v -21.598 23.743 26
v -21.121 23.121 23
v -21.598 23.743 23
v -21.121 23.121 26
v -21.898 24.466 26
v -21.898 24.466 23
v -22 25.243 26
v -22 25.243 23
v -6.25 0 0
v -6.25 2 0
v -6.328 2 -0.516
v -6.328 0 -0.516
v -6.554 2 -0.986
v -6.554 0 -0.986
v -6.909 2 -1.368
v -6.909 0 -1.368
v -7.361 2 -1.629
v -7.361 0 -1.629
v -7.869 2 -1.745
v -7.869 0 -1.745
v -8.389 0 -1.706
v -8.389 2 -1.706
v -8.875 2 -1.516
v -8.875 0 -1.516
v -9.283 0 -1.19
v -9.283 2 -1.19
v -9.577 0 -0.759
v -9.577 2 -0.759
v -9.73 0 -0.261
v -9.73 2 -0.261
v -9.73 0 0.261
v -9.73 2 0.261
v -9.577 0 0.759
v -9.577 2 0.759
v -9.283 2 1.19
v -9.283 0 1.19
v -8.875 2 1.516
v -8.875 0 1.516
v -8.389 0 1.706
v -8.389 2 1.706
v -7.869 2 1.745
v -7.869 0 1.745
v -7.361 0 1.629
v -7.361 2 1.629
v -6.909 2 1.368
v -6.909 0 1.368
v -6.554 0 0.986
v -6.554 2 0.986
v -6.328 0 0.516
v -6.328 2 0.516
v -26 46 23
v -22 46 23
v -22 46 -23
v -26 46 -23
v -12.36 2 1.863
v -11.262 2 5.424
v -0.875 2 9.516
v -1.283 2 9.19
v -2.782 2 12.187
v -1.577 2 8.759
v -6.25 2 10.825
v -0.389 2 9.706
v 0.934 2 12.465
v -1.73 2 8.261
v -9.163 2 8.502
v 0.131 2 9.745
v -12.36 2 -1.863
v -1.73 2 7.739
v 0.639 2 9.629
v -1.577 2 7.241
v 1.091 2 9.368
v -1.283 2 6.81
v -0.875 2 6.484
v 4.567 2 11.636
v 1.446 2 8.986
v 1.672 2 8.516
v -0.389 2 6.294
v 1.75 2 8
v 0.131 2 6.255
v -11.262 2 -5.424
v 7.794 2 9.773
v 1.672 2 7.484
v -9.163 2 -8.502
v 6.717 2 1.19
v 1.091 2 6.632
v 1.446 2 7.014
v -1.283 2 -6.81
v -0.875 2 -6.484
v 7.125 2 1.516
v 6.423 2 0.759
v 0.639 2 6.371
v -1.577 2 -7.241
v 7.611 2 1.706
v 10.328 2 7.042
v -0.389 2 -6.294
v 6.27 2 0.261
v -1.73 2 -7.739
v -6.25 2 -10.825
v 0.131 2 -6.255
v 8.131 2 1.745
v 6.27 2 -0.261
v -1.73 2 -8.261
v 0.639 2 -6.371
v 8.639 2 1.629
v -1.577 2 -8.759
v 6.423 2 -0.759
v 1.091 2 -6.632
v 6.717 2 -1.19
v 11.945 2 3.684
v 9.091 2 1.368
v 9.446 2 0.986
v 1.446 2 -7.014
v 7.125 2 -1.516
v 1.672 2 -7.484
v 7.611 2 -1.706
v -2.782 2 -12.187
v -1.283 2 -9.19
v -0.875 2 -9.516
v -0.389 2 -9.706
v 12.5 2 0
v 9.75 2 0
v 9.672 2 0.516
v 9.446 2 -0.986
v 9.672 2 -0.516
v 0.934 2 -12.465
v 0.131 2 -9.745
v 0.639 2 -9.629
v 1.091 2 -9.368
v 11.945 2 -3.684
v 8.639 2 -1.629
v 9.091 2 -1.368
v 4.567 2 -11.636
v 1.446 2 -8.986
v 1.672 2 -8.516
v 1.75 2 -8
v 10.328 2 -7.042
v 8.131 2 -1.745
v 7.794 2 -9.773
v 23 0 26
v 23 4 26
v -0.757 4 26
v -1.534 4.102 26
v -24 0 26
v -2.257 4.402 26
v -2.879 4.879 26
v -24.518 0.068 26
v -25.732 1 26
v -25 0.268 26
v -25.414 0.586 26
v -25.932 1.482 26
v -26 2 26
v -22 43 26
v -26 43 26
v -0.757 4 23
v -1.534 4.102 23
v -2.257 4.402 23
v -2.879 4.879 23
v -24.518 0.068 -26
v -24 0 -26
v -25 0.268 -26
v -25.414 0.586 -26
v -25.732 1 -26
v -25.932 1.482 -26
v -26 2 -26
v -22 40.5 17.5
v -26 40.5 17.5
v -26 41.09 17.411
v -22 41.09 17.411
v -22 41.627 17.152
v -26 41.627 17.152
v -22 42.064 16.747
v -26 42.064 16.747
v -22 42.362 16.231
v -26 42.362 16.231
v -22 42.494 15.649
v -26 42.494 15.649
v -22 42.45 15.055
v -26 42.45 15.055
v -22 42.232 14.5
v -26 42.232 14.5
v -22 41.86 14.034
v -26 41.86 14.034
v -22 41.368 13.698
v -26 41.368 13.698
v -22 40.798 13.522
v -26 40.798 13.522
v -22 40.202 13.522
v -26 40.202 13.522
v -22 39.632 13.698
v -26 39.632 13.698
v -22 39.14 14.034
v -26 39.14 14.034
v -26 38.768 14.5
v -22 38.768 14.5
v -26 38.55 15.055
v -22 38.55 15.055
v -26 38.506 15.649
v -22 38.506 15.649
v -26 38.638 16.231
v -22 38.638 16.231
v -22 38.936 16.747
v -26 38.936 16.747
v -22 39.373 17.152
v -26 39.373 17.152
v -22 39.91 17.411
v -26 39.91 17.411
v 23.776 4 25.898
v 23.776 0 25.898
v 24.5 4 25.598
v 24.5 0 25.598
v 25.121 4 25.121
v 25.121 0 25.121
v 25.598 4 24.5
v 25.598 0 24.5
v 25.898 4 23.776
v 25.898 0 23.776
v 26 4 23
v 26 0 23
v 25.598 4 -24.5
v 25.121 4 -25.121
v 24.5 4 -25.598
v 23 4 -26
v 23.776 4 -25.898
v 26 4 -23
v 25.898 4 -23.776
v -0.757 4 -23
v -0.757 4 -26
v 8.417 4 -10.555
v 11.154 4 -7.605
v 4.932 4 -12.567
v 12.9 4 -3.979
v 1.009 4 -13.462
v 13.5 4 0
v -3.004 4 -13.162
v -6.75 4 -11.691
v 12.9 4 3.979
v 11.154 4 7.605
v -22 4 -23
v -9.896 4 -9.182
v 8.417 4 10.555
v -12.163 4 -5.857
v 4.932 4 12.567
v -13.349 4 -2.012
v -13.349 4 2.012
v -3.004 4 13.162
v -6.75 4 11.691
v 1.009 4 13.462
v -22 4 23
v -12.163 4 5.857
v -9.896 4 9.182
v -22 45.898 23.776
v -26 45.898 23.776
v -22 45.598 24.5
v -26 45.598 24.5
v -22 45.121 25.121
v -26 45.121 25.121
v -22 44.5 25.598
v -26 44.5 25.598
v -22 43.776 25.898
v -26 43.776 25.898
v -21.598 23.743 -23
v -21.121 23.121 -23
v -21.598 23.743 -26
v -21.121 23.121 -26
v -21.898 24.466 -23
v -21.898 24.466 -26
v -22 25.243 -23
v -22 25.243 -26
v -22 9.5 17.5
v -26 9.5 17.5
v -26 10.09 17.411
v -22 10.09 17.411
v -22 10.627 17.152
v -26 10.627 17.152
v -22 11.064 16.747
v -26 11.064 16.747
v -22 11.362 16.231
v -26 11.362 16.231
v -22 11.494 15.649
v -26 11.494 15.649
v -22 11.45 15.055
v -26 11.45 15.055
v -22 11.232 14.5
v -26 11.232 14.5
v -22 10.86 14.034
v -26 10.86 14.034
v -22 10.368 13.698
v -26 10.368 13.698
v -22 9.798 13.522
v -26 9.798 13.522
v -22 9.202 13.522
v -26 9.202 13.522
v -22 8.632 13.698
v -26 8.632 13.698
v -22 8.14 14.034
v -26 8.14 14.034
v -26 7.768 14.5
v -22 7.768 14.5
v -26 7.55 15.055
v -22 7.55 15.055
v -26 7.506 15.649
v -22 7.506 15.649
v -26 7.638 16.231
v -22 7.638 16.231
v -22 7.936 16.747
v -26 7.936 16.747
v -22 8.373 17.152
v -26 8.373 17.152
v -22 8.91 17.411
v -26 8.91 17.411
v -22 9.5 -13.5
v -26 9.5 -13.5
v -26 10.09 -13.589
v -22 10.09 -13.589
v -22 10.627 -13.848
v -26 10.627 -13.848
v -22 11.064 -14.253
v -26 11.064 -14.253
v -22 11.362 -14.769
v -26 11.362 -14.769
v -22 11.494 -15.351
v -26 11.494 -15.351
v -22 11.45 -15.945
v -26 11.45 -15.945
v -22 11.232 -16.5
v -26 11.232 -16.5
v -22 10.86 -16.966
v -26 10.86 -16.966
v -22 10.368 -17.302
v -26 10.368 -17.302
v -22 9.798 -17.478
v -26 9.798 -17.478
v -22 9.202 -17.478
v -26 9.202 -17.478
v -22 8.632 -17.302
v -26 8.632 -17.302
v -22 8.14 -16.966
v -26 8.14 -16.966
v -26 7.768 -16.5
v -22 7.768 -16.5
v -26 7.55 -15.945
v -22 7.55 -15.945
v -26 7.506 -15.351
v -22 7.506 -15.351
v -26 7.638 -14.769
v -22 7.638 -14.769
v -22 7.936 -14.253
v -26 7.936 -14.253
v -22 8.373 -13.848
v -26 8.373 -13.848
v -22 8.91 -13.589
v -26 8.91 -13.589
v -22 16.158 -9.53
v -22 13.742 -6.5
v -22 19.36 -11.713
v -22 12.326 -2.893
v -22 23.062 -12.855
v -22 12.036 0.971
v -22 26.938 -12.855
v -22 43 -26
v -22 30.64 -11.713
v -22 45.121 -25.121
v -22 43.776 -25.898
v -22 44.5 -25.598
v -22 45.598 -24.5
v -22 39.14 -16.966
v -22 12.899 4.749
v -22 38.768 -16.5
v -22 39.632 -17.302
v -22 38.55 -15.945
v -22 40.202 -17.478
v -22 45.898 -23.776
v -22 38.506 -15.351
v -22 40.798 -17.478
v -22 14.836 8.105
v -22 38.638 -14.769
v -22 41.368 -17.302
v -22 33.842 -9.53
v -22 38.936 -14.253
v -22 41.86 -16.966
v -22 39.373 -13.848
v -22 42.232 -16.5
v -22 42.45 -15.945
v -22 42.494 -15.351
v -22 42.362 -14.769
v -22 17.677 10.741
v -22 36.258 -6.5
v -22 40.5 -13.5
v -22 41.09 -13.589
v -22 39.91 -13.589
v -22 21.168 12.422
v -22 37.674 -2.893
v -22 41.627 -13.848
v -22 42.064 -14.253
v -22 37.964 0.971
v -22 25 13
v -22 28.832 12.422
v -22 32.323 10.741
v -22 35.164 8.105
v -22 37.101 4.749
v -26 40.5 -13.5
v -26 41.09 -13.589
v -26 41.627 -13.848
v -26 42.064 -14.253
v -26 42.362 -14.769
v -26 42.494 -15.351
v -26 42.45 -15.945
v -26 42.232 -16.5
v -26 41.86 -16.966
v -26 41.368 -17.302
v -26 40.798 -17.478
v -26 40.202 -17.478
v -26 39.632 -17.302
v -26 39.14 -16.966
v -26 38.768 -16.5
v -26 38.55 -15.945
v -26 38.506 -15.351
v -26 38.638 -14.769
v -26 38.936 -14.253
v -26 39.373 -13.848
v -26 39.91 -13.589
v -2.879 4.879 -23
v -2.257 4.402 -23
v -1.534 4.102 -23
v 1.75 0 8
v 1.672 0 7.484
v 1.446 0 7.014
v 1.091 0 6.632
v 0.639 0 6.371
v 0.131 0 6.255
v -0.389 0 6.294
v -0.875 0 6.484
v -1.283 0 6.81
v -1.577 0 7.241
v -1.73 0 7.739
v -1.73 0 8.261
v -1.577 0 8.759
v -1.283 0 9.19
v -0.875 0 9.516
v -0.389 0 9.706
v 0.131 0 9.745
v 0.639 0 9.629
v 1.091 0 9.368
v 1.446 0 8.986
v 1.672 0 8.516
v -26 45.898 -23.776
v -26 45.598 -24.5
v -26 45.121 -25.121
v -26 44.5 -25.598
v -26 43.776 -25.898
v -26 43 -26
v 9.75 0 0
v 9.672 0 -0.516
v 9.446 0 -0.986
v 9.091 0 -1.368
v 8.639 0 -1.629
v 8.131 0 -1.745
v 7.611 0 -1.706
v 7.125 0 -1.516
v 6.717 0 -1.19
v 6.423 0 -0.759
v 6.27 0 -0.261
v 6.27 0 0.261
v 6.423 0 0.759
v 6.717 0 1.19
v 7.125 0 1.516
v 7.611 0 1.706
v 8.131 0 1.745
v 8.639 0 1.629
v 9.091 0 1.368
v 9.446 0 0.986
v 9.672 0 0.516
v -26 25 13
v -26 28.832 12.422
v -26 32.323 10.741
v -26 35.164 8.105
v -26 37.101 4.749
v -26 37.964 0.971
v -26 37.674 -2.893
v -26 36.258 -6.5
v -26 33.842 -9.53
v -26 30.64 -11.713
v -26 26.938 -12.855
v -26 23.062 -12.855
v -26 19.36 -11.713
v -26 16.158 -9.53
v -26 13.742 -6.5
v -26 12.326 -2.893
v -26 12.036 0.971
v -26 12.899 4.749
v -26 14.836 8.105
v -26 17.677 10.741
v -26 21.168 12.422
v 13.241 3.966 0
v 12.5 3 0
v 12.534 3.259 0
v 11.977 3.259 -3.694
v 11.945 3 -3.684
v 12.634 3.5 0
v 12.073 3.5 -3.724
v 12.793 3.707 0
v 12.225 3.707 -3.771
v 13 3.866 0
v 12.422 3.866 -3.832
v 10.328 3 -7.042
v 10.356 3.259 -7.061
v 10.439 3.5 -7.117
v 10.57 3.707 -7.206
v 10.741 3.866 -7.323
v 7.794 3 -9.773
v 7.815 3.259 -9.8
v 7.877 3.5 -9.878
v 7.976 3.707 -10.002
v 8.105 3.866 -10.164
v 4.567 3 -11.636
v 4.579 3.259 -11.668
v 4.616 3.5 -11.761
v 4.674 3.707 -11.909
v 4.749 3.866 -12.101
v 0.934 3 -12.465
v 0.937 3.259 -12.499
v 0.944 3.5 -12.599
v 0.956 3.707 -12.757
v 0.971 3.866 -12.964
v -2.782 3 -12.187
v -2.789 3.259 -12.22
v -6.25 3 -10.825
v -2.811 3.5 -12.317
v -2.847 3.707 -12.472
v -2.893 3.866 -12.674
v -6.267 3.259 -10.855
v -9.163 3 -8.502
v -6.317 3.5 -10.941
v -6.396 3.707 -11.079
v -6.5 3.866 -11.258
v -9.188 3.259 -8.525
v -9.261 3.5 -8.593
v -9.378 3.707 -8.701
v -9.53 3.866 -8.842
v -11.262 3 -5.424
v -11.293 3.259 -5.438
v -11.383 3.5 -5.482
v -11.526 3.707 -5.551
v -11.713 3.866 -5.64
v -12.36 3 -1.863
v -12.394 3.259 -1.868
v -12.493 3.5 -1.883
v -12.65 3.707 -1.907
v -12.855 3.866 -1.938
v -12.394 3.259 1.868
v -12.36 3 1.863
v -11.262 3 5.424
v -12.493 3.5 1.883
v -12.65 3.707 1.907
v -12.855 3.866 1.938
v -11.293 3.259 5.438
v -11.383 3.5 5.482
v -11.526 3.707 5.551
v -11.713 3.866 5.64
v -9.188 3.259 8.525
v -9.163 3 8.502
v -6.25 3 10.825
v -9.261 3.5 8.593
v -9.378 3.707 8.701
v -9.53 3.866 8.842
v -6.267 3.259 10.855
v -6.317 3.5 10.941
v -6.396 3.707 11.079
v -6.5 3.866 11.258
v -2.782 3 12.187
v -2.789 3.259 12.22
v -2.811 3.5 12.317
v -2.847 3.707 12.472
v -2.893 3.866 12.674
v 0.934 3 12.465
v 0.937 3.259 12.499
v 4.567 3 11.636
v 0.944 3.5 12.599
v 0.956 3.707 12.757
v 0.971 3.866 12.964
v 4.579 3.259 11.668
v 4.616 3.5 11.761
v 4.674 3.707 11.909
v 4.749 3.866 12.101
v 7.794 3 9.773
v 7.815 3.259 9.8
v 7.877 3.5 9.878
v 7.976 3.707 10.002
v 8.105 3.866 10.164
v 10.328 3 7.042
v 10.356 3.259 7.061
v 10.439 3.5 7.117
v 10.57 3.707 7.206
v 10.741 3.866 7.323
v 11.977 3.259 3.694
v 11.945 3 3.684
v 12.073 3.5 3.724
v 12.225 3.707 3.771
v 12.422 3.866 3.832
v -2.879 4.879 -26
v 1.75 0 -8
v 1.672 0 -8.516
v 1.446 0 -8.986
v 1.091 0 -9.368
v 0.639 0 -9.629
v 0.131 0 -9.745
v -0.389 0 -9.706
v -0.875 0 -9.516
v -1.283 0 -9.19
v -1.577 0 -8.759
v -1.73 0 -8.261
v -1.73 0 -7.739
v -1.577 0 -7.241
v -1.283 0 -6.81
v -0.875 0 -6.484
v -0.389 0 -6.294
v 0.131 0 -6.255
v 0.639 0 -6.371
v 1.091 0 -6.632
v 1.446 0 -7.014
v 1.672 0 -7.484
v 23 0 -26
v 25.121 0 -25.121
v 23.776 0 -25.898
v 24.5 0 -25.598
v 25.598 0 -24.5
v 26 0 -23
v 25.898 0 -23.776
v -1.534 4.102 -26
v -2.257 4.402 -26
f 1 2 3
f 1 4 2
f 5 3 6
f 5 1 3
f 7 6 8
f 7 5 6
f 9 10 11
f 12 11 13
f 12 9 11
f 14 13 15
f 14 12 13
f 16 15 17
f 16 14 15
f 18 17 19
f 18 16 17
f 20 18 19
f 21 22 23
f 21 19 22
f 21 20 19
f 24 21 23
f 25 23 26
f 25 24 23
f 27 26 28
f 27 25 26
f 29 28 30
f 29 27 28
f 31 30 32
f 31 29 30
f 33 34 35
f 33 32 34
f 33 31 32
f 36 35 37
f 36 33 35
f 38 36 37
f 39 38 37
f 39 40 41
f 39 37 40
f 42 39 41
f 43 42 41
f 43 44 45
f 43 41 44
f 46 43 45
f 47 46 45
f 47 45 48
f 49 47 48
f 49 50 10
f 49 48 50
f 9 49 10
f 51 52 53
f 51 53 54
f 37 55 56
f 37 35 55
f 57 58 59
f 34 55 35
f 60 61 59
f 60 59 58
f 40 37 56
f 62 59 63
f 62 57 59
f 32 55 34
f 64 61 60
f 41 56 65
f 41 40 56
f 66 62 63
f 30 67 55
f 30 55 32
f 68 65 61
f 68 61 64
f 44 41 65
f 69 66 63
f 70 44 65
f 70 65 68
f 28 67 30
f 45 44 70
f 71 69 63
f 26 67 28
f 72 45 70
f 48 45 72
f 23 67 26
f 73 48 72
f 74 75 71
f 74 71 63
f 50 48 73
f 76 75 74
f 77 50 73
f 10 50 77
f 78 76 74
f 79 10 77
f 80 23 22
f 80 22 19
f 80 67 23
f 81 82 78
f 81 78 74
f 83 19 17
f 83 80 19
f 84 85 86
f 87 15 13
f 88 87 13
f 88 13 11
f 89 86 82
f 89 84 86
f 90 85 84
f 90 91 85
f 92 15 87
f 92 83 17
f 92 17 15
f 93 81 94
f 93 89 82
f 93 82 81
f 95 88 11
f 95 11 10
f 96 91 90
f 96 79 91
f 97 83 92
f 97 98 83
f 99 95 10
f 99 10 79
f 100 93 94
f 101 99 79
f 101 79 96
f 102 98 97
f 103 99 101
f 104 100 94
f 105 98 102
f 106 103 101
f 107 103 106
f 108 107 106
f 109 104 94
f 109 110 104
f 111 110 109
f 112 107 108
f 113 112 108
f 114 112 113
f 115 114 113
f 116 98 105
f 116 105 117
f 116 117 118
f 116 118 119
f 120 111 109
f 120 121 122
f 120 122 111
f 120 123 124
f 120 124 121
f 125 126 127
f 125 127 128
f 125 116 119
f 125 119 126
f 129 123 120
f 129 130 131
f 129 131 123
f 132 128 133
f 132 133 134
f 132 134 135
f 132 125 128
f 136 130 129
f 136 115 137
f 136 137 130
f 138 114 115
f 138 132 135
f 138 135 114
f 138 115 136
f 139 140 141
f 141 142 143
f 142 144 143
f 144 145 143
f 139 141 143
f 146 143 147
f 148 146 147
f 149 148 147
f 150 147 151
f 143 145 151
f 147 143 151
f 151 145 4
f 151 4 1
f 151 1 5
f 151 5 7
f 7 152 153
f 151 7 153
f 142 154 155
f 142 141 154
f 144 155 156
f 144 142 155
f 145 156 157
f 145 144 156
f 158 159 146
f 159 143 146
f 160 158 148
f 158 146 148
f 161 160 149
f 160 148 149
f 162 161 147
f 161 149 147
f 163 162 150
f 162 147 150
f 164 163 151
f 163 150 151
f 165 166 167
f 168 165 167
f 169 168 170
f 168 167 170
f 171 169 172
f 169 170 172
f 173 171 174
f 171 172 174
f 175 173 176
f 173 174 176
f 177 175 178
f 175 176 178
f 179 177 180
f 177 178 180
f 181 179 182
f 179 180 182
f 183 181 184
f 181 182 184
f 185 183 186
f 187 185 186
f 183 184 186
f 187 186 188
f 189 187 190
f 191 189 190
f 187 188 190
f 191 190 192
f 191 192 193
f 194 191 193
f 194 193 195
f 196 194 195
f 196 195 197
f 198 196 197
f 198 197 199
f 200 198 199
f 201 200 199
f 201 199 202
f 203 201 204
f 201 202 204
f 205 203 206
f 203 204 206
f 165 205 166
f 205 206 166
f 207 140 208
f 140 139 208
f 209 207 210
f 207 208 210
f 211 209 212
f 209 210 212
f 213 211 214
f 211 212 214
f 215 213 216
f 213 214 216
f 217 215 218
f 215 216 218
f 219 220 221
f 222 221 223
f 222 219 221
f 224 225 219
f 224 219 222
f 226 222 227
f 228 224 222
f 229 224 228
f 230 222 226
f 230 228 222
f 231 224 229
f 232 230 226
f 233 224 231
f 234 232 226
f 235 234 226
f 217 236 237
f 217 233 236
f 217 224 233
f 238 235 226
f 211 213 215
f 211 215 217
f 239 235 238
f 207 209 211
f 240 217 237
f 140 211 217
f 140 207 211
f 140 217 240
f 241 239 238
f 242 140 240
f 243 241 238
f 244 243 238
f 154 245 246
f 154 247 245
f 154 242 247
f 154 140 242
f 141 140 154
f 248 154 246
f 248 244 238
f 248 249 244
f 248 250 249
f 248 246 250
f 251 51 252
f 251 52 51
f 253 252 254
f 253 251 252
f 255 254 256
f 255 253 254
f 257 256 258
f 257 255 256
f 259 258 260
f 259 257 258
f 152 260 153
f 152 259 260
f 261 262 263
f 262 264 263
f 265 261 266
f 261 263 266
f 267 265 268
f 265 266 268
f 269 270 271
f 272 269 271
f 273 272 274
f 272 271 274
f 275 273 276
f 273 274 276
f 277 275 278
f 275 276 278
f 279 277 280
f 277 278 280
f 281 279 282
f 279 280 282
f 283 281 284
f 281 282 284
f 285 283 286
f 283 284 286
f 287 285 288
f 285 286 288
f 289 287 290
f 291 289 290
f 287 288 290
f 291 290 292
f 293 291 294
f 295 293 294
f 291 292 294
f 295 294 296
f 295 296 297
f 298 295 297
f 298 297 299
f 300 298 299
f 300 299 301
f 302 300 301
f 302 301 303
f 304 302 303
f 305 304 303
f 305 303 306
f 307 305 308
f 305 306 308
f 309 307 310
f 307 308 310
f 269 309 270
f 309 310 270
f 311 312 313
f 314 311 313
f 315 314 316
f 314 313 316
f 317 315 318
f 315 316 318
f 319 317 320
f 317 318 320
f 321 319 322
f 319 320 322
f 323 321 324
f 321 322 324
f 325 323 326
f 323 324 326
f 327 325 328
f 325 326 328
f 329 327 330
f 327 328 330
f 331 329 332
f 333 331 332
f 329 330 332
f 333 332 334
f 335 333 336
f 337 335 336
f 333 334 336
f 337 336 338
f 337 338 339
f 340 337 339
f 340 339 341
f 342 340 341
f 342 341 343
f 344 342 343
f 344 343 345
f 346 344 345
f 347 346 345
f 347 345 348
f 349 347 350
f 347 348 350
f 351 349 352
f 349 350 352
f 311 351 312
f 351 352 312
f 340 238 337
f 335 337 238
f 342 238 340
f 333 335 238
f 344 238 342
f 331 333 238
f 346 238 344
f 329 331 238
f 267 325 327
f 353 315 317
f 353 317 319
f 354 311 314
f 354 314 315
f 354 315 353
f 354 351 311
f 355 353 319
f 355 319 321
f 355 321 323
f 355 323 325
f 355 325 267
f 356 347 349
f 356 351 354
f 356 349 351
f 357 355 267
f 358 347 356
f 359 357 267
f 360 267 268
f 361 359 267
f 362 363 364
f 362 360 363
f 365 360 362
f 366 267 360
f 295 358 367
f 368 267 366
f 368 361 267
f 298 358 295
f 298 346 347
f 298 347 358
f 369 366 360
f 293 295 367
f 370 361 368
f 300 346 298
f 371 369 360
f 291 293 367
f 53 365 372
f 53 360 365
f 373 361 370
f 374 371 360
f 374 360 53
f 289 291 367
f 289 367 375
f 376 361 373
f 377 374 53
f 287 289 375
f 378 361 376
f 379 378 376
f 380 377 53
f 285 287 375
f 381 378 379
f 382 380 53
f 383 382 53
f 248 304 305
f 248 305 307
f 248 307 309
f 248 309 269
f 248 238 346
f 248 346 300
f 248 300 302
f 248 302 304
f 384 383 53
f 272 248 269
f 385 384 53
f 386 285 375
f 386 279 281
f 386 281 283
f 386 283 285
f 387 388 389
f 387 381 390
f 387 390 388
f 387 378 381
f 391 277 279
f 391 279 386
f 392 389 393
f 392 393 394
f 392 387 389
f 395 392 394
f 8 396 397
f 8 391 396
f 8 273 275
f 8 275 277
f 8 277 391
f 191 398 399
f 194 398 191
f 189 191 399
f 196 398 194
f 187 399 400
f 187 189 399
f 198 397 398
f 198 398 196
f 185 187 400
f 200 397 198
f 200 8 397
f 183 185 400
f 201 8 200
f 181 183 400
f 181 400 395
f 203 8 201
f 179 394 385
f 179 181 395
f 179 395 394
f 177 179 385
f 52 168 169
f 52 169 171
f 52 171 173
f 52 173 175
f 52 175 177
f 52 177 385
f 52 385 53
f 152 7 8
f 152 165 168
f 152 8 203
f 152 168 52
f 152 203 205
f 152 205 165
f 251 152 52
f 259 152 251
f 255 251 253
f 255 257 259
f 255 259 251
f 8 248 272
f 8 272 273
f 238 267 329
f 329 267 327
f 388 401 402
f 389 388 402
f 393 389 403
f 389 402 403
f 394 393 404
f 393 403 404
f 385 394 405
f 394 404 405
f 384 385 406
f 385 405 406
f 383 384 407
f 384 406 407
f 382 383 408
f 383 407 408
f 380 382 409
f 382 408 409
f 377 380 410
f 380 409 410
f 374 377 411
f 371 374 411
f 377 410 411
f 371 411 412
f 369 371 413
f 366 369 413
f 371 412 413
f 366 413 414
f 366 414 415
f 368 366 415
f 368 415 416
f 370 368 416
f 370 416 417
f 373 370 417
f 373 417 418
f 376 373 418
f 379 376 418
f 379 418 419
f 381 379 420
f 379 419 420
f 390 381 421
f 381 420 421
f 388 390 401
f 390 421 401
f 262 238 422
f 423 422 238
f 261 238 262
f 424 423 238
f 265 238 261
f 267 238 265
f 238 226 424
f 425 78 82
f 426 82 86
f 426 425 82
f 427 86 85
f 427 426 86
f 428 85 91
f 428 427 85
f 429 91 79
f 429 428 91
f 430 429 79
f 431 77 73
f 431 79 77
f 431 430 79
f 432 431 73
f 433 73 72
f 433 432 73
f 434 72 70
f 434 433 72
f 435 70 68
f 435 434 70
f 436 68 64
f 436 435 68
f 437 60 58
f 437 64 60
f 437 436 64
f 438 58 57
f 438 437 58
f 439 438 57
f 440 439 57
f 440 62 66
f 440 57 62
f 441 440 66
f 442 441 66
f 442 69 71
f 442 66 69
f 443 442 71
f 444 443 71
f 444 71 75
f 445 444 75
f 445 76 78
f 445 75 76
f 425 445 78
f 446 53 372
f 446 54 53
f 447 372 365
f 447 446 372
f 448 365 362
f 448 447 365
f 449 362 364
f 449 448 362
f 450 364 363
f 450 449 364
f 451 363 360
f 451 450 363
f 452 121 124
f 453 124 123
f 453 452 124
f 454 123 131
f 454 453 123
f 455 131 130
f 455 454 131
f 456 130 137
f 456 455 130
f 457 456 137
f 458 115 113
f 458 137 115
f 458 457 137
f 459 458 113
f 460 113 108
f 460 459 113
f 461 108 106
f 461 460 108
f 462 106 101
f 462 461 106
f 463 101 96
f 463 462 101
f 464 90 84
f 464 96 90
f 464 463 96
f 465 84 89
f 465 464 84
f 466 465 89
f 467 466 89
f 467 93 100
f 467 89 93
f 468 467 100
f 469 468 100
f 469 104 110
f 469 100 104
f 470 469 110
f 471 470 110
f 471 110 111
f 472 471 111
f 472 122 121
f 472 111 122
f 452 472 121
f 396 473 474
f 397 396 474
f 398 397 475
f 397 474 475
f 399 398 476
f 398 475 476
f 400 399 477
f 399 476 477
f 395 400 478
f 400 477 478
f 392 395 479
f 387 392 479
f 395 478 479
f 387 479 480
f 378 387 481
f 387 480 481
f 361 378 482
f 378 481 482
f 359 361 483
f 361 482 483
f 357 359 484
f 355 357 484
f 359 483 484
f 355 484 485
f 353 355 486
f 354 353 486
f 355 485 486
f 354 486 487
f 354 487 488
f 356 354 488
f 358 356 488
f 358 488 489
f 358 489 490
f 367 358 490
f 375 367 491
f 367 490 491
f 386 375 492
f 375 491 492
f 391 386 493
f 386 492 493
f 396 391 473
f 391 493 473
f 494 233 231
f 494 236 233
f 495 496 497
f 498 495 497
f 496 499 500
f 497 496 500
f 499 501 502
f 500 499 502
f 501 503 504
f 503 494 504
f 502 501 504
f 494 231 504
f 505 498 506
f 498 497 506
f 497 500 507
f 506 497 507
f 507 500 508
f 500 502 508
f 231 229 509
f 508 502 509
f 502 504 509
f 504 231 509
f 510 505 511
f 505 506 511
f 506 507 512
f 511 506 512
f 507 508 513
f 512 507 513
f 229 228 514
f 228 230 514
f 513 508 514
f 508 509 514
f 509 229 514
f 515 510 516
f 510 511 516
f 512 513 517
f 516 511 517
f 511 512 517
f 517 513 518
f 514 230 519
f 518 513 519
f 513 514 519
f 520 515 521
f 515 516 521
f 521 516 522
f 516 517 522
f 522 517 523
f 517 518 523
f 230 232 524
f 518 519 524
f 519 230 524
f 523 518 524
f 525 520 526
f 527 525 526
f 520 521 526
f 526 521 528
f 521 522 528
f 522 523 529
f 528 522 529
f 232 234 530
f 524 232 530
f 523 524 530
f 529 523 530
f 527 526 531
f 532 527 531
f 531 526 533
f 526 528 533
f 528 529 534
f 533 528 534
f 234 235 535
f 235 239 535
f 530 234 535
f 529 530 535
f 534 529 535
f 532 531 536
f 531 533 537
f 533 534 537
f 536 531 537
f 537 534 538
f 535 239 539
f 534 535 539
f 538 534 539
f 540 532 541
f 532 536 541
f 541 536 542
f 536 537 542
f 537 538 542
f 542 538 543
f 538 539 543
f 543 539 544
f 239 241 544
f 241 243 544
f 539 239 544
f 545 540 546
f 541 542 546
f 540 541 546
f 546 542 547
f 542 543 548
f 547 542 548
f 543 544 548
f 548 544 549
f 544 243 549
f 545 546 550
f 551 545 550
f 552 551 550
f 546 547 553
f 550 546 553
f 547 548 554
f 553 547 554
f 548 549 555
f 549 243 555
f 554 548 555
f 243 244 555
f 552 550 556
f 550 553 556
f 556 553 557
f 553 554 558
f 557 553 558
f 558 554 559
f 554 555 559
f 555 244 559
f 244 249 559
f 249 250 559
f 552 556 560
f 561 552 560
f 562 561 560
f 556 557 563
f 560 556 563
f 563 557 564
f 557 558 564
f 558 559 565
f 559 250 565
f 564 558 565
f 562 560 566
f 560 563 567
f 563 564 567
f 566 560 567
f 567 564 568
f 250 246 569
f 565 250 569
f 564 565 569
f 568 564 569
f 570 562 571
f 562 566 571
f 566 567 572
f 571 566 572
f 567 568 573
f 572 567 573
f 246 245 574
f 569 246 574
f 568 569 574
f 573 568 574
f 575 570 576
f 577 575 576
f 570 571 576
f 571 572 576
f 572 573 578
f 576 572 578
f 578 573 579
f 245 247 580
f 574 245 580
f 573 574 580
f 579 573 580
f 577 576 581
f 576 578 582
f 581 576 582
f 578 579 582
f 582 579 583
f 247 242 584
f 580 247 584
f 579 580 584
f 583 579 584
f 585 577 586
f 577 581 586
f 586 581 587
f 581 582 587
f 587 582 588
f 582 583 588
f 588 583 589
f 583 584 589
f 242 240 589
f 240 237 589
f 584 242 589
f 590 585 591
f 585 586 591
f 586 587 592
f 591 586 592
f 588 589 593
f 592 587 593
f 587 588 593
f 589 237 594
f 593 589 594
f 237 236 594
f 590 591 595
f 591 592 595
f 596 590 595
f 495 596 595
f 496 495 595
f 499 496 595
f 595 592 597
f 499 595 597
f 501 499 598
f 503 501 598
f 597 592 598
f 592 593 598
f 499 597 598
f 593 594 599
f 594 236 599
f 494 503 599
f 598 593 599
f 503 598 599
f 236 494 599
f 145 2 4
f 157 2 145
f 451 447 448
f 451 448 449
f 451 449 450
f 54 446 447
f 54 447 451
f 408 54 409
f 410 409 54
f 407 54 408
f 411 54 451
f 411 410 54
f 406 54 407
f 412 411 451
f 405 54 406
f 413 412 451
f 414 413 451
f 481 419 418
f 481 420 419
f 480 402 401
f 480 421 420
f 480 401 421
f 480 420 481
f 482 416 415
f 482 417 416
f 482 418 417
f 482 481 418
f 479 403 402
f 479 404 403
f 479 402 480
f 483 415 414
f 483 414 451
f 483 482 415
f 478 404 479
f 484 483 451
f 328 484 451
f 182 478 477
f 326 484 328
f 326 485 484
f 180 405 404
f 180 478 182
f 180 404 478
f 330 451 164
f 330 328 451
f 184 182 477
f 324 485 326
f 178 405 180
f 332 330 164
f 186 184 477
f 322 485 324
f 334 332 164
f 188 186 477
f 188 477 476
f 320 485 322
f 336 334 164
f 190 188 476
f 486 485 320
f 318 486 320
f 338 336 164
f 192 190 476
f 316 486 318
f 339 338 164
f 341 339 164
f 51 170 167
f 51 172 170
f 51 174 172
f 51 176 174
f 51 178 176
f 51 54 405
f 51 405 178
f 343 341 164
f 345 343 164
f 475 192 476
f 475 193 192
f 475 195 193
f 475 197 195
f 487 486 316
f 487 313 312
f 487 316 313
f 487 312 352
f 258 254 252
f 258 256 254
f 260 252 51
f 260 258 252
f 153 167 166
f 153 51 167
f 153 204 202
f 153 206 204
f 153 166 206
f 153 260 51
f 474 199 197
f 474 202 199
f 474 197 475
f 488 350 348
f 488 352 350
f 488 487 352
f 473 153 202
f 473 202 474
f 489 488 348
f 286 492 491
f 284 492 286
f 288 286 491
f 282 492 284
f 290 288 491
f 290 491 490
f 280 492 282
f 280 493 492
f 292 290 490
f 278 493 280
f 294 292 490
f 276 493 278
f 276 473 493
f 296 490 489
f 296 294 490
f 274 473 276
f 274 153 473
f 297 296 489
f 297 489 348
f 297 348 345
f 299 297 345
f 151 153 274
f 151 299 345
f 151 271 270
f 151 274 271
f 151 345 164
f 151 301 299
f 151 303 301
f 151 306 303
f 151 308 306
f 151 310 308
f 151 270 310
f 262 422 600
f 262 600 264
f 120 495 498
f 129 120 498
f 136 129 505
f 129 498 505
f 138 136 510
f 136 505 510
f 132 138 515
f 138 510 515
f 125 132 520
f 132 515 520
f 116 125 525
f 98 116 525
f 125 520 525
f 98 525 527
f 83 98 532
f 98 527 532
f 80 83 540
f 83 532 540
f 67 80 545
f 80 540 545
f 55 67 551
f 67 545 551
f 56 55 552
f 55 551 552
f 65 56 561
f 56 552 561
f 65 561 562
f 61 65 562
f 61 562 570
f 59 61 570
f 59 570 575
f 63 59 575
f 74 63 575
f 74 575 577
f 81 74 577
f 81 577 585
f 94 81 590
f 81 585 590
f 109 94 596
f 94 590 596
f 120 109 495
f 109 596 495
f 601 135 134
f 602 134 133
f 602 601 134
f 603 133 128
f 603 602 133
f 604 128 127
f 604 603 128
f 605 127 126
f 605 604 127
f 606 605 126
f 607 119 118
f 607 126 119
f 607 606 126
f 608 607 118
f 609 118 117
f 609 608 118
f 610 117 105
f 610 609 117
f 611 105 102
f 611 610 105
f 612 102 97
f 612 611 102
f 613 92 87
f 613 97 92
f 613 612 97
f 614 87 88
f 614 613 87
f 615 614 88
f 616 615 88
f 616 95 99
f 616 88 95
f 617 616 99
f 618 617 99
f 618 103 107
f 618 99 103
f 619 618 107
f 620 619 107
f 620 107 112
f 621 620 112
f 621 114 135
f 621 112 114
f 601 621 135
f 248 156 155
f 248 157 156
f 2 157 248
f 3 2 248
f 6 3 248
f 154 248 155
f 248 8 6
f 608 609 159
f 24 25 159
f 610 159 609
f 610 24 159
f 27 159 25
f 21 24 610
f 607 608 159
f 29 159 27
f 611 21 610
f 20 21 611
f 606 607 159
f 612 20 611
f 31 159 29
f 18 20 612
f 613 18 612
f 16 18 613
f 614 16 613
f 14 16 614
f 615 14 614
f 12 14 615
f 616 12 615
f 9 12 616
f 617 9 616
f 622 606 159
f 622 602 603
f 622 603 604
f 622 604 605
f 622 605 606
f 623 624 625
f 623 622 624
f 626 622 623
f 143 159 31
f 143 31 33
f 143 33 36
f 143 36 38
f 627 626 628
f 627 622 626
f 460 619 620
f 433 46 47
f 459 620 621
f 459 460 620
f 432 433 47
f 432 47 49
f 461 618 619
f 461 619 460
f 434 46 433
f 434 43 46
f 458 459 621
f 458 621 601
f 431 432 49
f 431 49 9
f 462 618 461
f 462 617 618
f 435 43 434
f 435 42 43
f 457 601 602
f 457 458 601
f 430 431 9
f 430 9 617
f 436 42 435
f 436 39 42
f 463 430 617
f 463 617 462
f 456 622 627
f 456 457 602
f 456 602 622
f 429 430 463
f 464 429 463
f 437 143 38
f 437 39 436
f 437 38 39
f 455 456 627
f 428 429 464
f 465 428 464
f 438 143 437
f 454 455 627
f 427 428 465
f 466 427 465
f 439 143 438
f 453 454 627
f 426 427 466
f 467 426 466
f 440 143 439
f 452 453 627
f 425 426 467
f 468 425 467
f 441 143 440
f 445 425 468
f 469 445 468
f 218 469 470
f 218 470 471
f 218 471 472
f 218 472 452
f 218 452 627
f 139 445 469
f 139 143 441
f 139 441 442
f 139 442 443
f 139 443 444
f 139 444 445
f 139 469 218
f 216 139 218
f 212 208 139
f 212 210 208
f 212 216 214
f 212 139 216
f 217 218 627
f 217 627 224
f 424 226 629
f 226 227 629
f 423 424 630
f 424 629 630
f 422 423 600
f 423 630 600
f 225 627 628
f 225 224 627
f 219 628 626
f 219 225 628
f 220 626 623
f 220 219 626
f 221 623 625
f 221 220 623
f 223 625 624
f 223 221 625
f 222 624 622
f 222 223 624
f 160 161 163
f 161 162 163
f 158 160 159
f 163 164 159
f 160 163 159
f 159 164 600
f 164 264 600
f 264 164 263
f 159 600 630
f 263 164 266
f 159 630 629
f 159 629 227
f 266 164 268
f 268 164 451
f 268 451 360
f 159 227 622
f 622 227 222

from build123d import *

# Parameters (mm, degrees)
SKETCH_1_W          = 52
SKETCH_1_H          = 46
SKETCH_1_R          = 1.75
EXTRUDE_2_DEPTH     = 4
SKETCH_2_W          = 46
SKETCH_2_H          = 42
SKETCH_2_R          = 2
SKETCH_2_R_2        = 13
EXTRUDE_3_DEPTH     = 4
SKETCH_4_R          = 12.5
CUT_EXTRUDE_1_DEPTH = 2
EXTRUDE_4_DEPTH     = 3
EXTRUDE_5_DEPTH     = 3
FILLET_1_R          = 3
FILLET_2_R          = 3
FILLET_3_R          = 3
FILLET_4_R          = 3
FILLET_5_R          = 3
FILLET_6_R          = 3
FILLET_7_R          = 3
FILLET_8_R          = 3
FILLET_9_R          = 1
FILLET_10_R         = 2


with BuildPart() as part:
    # 草图1 → 凸台-拉伸2 (new body)
    with BuildSketch(Plane(origin=(0, 0, 0), x_dir=(1, 0, 0), z_dir=(0, 1, 0))):
        Rectangle(SKETCH_1_W, SKETCH_1_H)
        with Locations((8, 0)):
            Circle(SKETCH_1_R, mode=Mode.SUBTRACT)
        with Locations((0, 8)):
            Circle(SKETCH_1_R, mode=Mode.SUBTRACT)
        with Locations((-8, 0)):
            Circle(SKETCH_1_R, mode=Mode.SUBTRACT)
        with Locations((0, -8)):
            Circle(SKETCH_1_R, mode=Mode.SUBTRACT)
    extrude(amount=EXTRUDE_2_DEPTH)

    # 草图2 → 凸台-拉伸3 (add)
    with BuildSketch(Plane.ZY.offset(26)):
        with Locations((0, 25)):
            Rectangle(SKETCH_2_W, SKETCH_2_H)
        with Locations((15.5, 40.5)):
            Circle(SKETCH_2_R, mode=Mode.SUBTRACT)
        with Locations((15.5, 9.5)):
            Circle(SKETCH_2_R, mode=Mode.SUBTRACT)
        with Locations((-15.5, 9.5)):
            Circle(SKETCH_2_R, mode=Mode.SUBTRACT)
        with Locations((-15.5, 40.5)):
            Circle(SKETCH_2_R, mode=Mode.SUBTRACT)
        with Locations((0, 25)):
            Circle(SKETCH_2_R_2, mode=Mode.SUBTRACT)
    extrude(amount=-EXTRUDE_3_DEPTH)

    # 草图4 → 切除-拉伸1 (cut)
    with BuildSketch(Plane(origin=(0, 4, 0), x_dir=(1, 0, 0), z_dir=(0, 1, 0))):
        Circle(SKETCH_4_R)
    extrude(amount=-CUT_EXTRUDE_1_DEPTH, mode=Mode.SUBTRACT)

    # 草图6 → 凸台-拉伸4 (add)
    with BuildSketch(Plane.XY.offset(23)):
        Polygon((-26, 46), (-22, 46), (-22, 24), (-2, 4), (26, 4), (26, 0), (-26, 0), align=None)
    extrude(amount=EXTRUDE_4_DEPTH)

    # 草图7 → 凸台-拉伸5 (add)
    with BuildSketch(Plane(origin=(0, 0, -23), x_dir=(-1, 0, 0), z_dir=(0, 0, -1))):
        Polygon((26, 46), (26, 0), (-26, 0), (-26, 4), (2, 4), (22, 24), (22, 46), align=None)
    extrude(amount=EXTRUDE_5_DEPTH)

    # 圆角1
    fillet_1_edges = [part.edges().sort_by_distance(p)[0] for p in [
        (-24, 46, 26),
    ]]
    fillet(fillet_1_edges, radius=FILLET_1_R)

    # 圆角2
    fillet_2_edges = [part.edges().sort_by_distance(p)[0] for p in [
        (-24, 46, -26),
    ]]
    fillet(fillet_2_edges, radius=FILLET_2_R)

    # 圆角3
    fillet_3_edges = [part.edges().sort_by_distance(p)[0] for p in [
        (26, 2, 26),
    ]]
    fillet(fillet_3_edges, radius=FILLET_3_R)

    # 圆角4
    fillet_4_edges = [part.edges().sort_by_distance(p)[0] for p in [
        (26, 2, -26),
    ]]
    fillet(fillet_4_edges, radius=FILLET_4_R)

    # 圆角5
    fillet_5_edges = [part.edges().sort_by_distance(p)[0] for p in [
        (-22, 24, 24.5),
    ]]
    fillet(fillet_5_edges, radius=FILLET_5_R)

    # 圆角6
    fillet_6_edges = [part.edges().sort_by_distance(p)[0] for p in [
        (-2, 4, 24.5),
    ]]
    fillet(fillet_6_edges, radius=FILLET_6_R)

    # 圆角7
    fillet_7_edges = [part.edges().sort_by_distance(p)[0] for p in [
        (-22, 24, -24.5),
    ]]
    fillet(fillet_7_edges, radius=FILLET_7_R)

    # 圆角8
    fillet_8_edges = [part.edges().sort_by_distance(p)[0] for p in [
        (-2, 4, -24.5),
    ]]
    fillet(fillet_8_edges, radius=FILLET_8_R)

    # 圆角9
    fillet_9_edges = [part.edges().sort_by_distance(p)[0] for p in [
        (-12.5, 4, 0),
    ]]
    fillet(fillet_9_edges, radius=FILLET_9_R)

    # 圆角10
    fillet_10_edges = [part.edges().sort_by_distance(p)[0] for p in [
        (-26, 0, 0),
    ]]
    fillet(fillet_10_edges, radius=FILLET_10_R)


solid = part.part
